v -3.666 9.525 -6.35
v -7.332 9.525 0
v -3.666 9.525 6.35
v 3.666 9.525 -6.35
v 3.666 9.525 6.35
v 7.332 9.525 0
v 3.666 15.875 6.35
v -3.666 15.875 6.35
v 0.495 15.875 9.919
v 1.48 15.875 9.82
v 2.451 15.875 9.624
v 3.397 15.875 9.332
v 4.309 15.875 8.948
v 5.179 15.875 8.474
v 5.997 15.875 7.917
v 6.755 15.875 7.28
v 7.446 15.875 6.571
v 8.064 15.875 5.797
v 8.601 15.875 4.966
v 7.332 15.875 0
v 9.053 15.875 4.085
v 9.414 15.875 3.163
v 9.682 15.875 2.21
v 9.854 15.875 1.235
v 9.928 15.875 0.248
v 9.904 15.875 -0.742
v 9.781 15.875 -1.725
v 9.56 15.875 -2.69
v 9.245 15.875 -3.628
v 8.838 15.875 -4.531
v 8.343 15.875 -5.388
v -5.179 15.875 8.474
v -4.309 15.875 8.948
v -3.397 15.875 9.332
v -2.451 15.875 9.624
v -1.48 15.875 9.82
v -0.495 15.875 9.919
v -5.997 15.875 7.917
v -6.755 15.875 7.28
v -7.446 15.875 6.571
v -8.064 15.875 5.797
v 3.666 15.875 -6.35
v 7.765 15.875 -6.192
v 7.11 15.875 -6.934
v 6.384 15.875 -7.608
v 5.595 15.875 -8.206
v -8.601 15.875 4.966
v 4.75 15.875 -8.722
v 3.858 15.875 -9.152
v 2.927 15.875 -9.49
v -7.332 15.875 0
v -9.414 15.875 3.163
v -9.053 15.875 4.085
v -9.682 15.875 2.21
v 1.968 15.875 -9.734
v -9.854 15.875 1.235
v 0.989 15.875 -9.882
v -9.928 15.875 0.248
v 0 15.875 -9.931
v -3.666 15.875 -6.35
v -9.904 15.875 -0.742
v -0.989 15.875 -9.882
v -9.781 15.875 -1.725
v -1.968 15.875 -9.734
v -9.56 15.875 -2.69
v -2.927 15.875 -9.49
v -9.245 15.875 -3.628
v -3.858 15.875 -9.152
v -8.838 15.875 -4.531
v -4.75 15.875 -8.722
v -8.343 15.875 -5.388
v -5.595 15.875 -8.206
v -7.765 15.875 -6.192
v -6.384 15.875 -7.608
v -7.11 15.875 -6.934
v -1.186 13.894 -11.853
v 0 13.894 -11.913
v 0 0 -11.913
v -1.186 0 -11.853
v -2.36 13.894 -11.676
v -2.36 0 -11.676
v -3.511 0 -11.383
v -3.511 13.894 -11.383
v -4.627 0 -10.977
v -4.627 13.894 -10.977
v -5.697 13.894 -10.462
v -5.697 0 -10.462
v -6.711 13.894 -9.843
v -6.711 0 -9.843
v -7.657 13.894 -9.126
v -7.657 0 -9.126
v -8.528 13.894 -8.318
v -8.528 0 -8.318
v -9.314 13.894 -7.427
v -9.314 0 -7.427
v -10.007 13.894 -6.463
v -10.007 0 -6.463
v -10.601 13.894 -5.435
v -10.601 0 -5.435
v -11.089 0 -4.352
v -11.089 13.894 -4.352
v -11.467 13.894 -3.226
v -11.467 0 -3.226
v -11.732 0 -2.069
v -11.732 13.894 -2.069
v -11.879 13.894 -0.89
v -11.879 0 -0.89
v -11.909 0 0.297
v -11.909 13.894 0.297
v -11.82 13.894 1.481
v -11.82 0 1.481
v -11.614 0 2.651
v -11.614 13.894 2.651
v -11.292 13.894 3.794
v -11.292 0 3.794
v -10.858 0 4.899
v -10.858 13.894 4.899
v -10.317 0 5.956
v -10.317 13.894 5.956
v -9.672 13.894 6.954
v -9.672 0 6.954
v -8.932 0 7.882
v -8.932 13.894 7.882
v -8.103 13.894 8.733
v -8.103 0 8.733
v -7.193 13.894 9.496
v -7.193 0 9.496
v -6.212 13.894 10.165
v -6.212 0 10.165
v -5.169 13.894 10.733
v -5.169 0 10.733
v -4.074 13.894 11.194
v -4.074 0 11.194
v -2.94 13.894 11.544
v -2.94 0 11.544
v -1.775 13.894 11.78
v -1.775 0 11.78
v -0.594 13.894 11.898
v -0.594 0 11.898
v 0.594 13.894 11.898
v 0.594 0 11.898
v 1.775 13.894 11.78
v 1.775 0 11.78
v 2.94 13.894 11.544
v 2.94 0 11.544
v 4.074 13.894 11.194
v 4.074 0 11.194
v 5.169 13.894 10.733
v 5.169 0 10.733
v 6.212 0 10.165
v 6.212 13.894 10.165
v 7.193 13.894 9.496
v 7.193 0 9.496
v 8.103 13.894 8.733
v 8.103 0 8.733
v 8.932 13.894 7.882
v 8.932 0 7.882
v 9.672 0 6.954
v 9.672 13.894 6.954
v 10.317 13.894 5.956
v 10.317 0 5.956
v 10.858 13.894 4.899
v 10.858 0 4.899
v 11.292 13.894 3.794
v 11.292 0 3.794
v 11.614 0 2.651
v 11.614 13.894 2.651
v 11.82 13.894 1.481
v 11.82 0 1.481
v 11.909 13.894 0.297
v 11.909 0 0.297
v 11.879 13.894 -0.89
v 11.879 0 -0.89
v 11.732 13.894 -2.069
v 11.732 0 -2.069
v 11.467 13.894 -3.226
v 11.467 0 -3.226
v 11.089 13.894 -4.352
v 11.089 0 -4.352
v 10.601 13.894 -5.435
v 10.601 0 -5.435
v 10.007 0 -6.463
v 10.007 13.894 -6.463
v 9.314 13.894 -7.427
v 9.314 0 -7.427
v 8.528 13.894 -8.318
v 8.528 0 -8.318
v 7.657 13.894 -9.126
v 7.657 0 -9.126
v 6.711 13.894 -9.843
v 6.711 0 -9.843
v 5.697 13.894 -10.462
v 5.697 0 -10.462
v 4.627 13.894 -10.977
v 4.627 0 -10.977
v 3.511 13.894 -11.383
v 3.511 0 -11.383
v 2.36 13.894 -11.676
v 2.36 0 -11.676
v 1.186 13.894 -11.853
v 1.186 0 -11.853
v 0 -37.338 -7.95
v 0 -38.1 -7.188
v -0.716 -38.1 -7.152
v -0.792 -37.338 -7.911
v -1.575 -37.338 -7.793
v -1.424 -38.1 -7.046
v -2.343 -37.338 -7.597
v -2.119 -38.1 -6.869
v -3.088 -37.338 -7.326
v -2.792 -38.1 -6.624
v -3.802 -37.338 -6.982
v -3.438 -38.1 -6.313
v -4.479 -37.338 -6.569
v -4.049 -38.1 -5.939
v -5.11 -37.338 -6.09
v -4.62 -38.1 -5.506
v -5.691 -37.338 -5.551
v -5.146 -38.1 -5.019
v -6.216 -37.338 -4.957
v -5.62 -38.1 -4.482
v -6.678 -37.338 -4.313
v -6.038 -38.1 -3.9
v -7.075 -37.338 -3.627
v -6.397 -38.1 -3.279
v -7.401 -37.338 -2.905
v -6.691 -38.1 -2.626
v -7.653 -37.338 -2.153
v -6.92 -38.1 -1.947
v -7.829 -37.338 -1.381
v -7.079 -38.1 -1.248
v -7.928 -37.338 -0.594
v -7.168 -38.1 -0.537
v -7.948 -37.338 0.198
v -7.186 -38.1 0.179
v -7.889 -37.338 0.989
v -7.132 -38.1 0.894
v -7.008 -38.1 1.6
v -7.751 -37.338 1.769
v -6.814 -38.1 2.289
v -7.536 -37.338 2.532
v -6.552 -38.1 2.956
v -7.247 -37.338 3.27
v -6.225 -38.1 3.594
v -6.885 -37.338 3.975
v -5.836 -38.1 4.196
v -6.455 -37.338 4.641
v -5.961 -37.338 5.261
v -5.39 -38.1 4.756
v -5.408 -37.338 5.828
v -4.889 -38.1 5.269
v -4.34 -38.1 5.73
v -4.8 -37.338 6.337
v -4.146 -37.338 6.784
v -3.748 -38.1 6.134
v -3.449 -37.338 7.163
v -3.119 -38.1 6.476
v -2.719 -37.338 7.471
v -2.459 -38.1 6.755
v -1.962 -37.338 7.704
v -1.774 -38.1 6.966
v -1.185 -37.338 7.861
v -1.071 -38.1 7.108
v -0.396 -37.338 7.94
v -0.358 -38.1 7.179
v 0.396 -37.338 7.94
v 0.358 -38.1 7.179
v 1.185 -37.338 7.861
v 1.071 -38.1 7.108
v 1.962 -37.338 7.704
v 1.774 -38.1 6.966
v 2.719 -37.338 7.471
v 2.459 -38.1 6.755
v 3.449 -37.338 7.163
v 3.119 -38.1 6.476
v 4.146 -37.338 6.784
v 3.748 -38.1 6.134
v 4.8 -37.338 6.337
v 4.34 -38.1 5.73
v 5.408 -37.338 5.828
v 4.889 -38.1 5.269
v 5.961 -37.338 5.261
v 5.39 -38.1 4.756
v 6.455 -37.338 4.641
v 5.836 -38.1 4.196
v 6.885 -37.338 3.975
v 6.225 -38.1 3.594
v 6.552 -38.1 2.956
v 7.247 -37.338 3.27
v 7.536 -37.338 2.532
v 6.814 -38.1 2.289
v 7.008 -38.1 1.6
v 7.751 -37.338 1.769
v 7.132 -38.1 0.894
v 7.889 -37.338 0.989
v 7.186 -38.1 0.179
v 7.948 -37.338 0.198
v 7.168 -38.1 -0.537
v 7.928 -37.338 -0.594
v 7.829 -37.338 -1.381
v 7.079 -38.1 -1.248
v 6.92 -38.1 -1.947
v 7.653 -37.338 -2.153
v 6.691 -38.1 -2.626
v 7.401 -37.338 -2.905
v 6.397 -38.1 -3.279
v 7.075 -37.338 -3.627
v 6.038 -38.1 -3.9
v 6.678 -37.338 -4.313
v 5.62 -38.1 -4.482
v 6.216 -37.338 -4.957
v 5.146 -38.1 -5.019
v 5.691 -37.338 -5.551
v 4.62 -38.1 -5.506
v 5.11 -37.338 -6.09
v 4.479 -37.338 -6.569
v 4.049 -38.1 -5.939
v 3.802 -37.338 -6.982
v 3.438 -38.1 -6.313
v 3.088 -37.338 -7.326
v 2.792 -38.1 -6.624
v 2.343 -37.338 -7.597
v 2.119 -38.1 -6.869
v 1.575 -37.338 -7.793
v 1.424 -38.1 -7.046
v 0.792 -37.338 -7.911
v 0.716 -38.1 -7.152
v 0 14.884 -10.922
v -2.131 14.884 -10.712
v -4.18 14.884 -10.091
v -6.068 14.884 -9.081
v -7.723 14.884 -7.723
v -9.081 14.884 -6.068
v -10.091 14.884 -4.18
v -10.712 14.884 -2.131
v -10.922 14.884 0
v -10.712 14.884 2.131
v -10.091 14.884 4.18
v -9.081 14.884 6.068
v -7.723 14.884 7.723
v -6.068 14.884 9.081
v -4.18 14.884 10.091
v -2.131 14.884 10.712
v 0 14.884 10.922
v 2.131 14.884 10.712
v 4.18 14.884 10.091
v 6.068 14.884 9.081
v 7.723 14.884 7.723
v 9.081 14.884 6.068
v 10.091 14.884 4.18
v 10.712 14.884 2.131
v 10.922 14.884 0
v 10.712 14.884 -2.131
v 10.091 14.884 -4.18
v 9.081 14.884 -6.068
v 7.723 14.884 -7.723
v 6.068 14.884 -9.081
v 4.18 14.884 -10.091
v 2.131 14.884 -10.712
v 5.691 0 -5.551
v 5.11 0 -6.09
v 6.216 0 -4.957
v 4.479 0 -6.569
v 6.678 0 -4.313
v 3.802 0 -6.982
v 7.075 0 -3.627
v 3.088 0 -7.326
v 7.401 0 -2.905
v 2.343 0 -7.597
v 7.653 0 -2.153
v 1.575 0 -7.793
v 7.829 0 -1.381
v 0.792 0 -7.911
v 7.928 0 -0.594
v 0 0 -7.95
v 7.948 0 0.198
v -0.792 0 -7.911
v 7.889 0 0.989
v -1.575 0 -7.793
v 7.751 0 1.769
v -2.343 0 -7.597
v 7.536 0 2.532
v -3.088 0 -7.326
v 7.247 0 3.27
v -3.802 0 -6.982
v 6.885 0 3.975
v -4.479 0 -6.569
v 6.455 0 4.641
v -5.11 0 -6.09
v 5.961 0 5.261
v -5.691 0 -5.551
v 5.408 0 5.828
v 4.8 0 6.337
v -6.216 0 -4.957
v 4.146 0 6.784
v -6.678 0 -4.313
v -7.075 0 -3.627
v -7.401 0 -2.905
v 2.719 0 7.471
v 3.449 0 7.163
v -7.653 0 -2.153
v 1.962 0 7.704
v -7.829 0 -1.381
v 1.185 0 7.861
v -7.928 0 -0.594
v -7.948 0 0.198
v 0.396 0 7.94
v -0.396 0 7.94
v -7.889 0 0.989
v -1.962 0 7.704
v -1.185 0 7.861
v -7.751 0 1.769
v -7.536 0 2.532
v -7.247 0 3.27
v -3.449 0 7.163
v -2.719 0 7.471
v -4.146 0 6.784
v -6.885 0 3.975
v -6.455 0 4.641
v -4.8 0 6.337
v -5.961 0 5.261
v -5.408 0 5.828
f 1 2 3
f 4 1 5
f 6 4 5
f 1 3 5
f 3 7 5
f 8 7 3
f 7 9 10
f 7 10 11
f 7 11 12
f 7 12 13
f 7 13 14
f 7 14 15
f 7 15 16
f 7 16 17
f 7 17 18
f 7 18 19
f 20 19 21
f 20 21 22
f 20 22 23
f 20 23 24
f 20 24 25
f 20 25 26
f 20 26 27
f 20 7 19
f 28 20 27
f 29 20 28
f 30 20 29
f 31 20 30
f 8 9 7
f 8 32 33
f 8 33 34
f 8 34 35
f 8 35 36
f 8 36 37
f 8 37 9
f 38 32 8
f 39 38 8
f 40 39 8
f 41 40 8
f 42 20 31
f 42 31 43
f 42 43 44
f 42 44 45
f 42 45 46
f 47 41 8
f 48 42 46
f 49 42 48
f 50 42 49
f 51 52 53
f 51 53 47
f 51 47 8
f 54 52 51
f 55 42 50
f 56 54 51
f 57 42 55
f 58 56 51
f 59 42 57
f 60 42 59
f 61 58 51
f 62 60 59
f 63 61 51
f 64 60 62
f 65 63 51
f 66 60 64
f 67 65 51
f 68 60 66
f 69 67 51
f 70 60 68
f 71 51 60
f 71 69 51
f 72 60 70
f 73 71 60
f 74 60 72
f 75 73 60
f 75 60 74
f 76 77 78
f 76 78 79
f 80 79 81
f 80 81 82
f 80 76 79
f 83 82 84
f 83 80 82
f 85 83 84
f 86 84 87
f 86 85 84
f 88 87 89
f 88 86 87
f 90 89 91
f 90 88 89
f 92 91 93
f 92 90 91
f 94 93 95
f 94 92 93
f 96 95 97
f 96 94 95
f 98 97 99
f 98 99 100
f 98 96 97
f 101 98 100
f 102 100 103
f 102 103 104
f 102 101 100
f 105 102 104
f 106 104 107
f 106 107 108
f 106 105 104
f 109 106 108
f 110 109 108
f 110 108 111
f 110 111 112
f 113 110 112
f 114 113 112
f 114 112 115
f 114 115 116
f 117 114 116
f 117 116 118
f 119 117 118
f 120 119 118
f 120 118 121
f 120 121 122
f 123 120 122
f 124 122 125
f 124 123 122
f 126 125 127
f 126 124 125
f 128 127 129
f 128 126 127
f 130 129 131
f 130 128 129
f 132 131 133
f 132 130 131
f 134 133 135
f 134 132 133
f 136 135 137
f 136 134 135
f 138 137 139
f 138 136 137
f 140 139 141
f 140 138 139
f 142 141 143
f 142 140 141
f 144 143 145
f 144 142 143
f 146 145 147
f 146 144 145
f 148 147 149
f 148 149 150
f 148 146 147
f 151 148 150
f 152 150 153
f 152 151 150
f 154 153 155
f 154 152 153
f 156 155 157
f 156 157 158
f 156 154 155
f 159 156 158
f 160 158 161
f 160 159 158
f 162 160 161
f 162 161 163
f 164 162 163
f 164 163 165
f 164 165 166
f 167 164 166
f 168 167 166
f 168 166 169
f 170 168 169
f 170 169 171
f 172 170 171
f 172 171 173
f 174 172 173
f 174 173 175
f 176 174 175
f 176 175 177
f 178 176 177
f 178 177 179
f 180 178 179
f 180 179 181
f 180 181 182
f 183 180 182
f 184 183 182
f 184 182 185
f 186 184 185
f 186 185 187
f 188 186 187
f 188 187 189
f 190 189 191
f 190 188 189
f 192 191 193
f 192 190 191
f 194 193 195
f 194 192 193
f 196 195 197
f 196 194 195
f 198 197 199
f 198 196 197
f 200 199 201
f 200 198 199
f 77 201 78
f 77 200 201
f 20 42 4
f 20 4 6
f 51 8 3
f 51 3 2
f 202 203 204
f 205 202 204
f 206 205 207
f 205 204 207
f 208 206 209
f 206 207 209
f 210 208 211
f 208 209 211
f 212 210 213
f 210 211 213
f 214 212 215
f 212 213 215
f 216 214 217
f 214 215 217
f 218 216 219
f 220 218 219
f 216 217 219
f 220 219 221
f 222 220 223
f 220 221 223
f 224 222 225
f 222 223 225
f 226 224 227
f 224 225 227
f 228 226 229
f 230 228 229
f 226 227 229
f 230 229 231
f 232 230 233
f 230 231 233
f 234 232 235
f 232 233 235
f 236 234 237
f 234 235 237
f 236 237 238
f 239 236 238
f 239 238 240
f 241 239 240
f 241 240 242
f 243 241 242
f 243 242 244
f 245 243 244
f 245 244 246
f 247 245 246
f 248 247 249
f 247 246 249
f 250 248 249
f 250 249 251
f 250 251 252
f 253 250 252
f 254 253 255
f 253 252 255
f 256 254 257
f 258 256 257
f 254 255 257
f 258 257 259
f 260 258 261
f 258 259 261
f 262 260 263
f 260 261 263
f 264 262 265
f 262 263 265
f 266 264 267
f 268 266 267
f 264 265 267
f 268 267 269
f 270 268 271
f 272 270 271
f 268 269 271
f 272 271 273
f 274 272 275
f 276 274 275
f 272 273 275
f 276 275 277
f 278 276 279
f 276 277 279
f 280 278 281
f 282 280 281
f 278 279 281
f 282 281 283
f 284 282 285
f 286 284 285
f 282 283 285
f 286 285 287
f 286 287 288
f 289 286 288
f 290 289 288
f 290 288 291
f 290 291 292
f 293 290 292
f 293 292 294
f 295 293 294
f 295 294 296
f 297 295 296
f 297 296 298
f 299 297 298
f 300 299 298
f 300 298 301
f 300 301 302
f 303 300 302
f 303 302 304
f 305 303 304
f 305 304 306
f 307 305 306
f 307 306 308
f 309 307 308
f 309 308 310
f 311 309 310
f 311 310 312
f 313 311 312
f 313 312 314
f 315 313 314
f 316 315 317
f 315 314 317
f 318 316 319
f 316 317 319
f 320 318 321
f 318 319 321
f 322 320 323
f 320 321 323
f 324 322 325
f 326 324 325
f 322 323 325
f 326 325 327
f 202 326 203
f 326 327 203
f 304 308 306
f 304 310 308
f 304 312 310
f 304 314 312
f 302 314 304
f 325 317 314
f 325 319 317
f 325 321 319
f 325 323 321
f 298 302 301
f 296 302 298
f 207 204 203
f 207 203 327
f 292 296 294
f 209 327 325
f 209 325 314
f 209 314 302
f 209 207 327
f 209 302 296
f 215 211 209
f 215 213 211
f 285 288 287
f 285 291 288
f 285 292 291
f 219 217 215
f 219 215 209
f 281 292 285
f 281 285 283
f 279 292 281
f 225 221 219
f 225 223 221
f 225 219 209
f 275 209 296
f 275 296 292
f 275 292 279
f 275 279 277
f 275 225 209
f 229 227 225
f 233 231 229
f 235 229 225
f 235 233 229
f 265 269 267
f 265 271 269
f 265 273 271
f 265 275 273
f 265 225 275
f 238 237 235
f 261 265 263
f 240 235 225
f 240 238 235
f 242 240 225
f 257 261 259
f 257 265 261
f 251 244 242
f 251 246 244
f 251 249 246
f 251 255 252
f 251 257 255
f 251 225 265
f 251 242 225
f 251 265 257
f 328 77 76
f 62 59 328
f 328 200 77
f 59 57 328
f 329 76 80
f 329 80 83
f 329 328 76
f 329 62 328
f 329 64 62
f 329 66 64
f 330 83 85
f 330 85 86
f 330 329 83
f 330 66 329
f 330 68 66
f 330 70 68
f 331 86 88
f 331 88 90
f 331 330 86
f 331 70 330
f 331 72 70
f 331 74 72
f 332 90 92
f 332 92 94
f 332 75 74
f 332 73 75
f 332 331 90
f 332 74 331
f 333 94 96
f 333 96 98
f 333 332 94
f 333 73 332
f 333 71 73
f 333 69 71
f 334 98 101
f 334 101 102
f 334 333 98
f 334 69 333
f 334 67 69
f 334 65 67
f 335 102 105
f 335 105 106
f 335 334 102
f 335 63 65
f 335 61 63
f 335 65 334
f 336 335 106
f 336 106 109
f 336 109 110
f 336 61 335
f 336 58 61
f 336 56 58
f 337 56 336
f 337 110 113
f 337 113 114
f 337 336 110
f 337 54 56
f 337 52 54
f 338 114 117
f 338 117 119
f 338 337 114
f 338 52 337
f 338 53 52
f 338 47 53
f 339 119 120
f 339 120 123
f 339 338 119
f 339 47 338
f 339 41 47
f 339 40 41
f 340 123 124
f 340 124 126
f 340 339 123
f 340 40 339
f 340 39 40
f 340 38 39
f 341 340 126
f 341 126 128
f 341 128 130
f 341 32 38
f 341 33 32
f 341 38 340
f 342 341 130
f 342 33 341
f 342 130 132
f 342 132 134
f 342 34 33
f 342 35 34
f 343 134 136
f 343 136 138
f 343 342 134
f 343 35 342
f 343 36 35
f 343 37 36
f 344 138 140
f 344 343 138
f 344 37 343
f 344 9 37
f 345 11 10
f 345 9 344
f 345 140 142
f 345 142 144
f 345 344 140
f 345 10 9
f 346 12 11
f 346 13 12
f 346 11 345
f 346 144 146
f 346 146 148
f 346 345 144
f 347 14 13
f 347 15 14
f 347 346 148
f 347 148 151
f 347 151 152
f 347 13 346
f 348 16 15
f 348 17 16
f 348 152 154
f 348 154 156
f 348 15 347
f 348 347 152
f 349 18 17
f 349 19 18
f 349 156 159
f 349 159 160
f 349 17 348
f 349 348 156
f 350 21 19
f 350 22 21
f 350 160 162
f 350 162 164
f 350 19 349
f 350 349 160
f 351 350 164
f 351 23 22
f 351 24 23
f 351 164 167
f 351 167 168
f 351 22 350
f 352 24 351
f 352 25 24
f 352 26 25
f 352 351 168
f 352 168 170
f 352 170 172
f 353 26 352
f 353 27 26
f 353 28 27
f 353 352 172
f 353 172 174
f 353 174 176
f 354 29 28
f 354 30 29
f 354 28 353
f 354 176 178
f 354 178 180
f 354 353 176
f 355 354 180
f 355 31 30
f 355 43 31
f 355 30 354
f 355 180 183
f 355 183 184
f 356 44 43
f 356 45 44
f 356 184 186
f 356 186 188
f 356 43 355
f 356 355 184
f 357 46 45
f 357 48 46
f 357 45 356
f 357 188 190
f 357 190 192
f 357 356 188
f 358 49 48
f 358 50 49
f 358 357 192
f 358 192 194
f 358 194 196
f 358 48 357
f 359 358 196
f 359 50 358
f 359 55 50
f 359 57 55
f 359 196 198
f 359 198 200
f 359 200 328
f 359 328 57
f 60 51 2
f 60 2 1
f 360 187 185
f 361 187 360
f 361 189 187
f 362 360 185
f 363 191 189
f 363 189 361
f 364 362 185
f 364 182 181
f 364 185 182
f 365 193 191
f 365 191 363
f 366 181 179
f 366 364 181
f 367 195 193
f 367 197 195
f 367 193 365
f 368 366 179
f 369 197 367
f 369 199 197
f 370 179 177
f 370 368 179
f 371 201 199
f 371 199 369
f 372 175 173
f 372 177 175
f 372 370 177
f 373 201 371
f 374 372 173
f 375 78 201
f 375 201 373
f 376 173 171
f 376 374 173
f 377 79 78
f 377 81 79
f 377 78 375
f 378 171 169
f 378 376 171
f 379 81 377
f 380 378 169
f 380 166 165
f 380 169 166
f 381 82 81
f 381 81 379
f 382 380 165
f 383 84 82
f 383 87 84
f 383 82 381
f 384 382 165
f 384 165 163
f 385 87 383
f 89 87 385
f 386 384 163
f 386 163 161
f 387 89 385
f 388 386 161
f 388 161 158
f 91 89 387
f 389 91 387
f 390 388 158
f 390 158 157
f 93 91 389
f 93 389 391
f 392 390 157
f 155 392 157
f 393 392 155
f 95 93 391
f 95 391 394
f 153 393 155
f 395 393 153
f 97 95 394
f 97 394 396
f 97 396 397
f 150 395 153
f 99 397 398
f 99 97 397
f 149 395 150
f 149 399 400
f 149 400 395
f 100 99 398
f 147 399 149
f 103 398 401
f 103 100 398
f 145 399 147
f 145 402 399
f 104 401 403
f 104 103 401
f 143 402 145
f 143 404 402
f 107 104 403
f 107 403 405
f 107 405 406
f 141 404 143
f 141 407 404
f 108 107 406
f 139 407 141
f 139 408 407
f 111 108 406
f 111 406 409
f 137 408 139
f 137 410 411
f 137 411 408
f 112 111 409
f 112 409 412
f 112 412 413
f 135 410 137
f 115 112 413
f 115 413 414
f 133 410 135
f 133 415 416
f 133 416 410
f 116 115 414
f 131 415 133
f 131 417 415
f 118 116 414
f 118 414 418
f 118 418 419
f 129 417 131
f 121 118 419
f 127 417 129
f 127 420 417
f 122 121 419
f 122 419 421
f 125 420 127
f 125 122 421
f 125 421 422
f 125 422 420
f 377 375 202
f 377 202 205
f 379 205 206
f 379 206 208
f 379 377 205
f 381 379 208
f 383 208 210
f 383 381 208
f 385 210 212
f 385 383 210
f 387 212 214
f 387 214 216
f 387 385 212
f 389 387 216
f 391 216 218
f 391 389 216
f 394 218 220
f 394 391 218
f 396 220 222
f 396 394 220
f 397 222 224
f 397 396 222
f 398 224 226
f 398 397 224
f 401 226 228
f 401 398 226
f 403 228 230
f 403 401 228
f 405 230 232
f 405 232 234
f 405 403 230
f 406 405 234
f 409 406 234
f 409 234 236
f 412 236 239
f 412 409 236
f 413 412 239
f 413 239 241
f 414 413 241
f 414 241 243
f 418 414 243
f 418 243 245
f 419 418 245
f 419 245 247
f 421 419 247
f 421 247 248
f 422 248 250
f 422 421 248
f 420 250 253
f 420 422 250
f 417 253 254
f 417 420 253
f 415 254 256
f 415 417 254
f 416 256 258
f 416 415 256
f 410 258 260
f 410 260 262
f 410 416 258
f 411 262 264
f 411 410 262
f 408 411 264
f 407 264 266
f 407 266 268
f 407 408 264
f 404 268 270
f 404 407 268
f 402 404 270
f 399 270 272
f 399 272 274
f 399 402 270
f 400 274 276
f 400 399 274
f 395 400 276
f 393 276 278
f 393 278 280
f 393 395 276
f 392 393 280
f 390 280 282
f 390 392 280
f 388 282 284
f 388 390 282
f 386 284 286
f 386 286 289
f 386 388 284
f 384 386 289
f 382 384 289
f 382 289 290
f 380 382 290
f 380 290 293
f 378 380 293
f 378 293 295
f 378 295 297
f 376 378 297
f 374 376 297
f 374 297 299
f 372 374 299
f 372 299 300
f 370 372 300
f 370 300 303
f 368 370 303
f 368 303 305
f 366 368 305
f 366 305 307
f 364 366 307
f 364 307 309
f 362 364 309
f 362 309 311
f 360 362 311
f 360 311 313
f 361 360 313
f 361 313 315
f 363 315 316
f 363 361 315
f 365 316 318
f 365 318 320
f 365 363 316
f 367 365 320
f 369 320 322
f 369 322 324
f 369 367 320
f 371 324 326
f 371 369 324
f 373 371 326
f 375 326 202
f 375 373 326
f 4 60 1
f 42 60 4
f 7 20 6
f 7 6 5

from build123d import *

# Parameters (mm, degrees)
CUT_EXTRUDE1_DEPTH = 6.35
CHAMFER1_SIZE      = 1.9812
CHAMFER2_SIZE      = 0.762


with BuildPart() as part:
    # Sketch1 → Base-Revolve (revolve)
    with BuildSketch(Plane.XY, mode=Mode.PRIVATE) as base_revolve_sk:
        Polygon((7.9502, 0), (11.9126, 0), (11.9126, 15.875), (0, 15.875), (0, -38.1), (7.9502, -38.1), align=None)
    revolve(base_revolve_sk.sketch.rotate(Axis((0, 0, 0), (0, 1, 0)), 90), axis=Axis((0, 0, 0), (0, 1, 0)))

    # Sketch2 → Cut-Extrude1 (cut)
    with BuildSketch(Plane(origin=(0, 15.875, 0), x_dir=(-1, 0, 0), z_dir=(0, 1, 0))):
        Polygon((3.666174209, -6.35), (-3.666174209, -6.35), (-7.332348419, 0), (-3.666174209, 6.35), (3.666174209, 6.35), (7.332348419, 0), align=None)
    extrude(amount=-CUT_EXTRUDE1_DEPTH, mode=Mode.SUBTRACT)

    # Chamfer1
    chamfer1_edges = [part.edges().sort_by_distance(p)[0] for p in [
        (0, 15.875, 11.9126),
    ]]
    chamfer(chamfer1_edges, length=CHAMFER1_SIZE)

    # Chamfer2
    chamfer2_edges = [part.edges().sort_by_distance(p)[0] for p in [
        (0, -38.1, 7.9502),
    ]]
    chamfer(chamfer2_edges, length=CHAMFER2_SIZE)


solid = part.part
